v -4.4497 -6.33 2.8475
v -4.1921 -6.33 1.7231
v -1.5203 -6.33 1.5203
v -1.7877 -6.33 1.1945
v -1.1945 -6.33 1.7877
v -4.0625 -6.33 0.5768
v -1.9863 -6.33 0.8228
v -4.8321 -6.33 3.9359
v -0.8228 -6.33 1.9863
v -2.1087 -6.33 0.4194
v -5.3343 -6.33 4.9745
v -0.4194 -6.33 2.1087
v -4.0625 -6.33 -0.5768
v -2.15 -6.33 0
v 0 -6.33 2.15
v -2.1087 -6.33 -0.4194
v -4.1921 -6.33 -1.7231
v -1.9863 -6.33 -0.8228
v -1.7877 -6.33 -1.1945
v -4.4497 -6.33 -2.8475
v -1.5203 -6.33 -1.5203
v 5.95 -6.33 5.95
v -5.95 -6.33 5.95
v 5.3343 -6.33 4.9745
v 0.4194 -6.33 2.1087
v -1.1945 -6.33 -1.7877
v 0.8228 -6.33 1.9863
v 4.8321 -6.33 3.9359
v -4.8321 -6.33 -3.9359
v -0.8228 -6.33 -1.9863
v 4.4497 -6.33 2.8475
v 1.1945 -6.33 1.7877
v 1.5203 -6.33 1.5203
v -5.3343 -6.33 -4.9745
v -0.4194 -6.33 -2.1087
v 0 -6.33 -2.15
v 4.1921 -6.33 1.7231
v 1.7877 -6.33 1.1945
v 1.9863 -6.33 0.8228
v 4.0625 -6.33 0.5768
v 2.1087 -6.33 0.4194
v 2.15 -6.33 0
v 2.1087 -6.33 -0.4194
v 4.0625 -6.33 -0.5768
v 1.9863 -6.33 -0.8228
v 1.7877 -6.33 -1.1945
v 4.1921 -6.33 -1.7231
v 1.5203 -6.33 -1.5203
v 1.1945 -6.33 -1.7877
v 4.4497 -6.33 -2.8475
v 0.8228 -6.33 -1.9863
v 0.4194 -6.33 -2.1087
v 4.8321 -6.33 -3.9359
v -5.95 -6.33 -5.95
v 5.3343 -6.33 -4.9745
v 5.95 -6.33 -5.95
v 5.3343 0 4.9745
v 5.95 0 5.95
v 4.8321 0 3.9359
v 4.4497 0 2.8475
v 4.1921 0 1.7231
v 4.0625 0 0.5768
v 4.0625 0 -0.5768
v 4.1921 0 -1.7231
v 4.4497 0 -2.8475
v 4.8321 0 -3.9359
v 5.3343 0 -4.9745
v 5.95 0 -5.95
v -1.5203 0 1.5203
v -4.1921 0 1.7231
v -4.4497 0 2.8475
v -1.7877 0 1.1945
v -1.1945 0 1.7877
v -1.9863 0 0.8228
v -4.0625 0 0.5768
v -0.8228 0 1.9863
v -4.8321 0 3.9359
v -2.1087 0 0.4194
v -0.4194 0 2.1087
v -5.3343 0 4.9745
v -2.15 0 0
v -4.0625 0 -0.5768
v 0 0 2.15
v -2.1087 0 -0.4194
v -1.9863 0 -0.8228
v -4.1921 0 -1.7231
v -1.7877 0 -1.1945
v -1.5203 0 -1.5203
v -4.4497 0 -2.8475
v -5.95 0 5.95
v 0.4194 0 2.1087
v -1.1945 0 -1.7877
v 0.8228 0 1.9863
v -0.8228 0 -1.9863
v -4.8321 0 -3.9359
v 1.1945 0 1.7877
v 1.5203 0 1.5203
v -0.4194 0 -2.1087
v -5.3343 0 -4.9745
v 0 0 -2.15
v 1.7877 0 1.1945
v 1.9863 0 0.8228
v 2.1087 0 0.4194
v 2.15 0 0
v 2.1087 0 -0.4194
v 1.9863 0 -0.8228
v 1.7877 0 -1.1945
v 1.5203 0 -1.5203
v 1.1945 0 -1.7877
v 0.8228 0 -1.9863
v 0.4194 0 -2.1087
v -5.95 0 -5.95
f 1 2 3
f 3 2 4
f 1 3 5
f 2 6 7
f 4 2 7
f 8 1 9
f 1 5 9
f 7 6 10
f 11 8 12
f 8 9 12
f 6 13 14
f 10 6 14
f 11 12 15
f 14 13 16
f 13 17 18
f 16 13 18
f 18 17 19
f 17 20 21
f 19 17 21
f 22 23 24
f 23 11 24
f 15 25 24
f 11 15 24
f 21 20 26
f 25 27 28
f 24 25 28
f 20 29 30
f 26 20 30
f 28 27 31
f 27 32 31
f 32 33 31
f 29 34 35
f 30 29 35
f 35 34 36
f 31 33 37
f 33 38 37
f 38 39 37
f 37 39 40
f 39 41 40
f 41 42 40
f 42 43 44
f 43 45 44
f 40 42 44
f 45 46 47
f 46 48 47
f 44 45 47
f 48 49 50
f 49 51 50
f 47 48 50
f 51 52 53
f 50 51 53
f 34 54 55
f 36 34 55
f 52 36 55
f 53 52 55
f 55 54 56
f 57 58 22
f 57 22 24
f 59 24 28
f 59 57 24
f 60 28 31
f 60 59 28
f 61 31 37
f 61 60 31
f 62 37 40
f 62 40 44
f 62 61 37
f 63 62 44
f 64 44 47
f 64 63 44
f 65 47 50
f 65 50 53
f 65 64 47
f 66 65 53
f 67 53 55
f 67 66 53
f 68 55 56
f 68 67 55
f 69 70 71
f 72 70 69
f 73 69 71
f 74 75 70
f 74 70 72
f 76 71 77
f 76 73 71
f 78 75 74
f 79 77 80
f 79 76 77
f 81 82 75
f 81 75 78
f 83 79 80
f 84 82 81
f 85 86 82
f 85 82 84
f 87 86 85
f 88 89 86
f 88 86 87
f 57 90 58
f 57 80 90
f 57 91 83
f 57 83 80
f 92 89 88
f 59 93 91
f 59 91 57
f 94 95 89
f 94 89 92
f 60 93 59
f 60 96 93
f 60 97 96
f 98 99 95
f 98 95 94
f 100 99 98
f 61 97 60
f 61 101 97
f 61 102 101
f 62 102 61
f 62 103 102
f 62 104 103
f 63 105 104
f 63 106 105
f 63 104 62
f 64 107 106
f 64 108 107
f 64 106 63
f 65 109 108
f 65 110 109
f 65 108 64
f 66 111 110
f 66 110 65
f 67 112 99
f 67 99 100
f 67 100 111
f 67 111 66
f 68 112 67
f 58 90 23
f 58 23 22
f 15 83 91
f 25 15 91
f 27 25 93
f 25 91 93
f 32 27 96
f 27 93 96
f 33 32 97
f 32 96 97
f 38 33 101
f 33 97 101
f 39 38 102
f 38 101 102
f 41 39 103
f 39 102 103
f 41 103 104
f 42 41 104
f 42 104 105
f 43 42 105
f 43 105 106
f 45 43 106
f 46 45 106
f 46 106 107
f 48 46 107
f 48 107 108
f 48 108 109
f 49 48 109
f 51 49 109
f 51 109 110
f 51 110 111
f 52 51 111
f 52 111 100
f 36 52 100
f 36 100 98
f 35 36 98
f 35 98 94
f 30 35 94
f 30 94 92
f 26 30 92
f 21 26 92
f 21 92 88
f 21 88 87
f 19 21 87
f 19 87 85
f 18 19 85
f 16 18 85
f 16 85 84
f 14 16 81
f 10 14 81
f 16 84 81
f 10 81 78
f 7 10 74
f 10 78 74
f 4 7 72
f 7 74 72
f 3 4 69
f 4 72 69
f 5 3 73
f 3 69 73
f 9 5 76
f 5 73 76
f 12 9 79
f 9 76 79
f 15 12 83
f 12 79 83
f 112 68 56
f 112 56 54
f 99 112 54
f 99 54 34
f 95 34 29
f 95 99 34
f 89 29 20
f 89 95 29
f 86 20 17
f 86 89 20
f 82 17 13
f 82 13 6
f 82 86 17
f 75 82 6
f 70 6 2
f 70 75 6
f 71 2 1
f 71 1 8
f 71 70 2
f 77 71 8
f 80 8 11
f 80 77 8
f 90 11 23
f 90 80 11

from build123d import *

# Parameters (mm, degrees)
BOSS_EXTRUDE1_DEPTH = 6.33
SKETCH2_R           = 2.15
CUT_EXTRUDE1_DEPTH  = 11.529667611


with BuildPart() as part:
    # Sketch1 → Boss-Extrude1 (new body)
    with BuildSketch(Plane(origin=(0, 0, 0), x_dir=(1, 0, 0), z_dir=(0, 1, 0))):
        with BuildLine():
            Line((-5.95, -5.95), (5.95, -5.95))
            ThreePointArc((5.95, -5.95), (4.046256646, 0), (5.95, 5.95))
            Line((5.95, 5.95), (-5.95, 5.95))
            ThreePointArc((-5.95, 5.95), (-4.046256646, 0), (-5.95, -5.95))
        make_face()
    extrude(amount=-BOSS_EXTRUDE1_DEPTH)

    # Sketch2 → Cut-Extrude1 (cut, through all)
    with BuildSketch(Plane(origin=(0, 0, 0), x_dir=(1, 0, 0), z_dir=(0, 1, 0))):
        with Locations(Location((0, 0, 0), (0, 0, 270))):
            Circle(SKETCH2_R)
    extrude(amount=-CUT_EXTRUDE1_DEPTH, mode=Mode.SUBTRACT)


solid = part.part
